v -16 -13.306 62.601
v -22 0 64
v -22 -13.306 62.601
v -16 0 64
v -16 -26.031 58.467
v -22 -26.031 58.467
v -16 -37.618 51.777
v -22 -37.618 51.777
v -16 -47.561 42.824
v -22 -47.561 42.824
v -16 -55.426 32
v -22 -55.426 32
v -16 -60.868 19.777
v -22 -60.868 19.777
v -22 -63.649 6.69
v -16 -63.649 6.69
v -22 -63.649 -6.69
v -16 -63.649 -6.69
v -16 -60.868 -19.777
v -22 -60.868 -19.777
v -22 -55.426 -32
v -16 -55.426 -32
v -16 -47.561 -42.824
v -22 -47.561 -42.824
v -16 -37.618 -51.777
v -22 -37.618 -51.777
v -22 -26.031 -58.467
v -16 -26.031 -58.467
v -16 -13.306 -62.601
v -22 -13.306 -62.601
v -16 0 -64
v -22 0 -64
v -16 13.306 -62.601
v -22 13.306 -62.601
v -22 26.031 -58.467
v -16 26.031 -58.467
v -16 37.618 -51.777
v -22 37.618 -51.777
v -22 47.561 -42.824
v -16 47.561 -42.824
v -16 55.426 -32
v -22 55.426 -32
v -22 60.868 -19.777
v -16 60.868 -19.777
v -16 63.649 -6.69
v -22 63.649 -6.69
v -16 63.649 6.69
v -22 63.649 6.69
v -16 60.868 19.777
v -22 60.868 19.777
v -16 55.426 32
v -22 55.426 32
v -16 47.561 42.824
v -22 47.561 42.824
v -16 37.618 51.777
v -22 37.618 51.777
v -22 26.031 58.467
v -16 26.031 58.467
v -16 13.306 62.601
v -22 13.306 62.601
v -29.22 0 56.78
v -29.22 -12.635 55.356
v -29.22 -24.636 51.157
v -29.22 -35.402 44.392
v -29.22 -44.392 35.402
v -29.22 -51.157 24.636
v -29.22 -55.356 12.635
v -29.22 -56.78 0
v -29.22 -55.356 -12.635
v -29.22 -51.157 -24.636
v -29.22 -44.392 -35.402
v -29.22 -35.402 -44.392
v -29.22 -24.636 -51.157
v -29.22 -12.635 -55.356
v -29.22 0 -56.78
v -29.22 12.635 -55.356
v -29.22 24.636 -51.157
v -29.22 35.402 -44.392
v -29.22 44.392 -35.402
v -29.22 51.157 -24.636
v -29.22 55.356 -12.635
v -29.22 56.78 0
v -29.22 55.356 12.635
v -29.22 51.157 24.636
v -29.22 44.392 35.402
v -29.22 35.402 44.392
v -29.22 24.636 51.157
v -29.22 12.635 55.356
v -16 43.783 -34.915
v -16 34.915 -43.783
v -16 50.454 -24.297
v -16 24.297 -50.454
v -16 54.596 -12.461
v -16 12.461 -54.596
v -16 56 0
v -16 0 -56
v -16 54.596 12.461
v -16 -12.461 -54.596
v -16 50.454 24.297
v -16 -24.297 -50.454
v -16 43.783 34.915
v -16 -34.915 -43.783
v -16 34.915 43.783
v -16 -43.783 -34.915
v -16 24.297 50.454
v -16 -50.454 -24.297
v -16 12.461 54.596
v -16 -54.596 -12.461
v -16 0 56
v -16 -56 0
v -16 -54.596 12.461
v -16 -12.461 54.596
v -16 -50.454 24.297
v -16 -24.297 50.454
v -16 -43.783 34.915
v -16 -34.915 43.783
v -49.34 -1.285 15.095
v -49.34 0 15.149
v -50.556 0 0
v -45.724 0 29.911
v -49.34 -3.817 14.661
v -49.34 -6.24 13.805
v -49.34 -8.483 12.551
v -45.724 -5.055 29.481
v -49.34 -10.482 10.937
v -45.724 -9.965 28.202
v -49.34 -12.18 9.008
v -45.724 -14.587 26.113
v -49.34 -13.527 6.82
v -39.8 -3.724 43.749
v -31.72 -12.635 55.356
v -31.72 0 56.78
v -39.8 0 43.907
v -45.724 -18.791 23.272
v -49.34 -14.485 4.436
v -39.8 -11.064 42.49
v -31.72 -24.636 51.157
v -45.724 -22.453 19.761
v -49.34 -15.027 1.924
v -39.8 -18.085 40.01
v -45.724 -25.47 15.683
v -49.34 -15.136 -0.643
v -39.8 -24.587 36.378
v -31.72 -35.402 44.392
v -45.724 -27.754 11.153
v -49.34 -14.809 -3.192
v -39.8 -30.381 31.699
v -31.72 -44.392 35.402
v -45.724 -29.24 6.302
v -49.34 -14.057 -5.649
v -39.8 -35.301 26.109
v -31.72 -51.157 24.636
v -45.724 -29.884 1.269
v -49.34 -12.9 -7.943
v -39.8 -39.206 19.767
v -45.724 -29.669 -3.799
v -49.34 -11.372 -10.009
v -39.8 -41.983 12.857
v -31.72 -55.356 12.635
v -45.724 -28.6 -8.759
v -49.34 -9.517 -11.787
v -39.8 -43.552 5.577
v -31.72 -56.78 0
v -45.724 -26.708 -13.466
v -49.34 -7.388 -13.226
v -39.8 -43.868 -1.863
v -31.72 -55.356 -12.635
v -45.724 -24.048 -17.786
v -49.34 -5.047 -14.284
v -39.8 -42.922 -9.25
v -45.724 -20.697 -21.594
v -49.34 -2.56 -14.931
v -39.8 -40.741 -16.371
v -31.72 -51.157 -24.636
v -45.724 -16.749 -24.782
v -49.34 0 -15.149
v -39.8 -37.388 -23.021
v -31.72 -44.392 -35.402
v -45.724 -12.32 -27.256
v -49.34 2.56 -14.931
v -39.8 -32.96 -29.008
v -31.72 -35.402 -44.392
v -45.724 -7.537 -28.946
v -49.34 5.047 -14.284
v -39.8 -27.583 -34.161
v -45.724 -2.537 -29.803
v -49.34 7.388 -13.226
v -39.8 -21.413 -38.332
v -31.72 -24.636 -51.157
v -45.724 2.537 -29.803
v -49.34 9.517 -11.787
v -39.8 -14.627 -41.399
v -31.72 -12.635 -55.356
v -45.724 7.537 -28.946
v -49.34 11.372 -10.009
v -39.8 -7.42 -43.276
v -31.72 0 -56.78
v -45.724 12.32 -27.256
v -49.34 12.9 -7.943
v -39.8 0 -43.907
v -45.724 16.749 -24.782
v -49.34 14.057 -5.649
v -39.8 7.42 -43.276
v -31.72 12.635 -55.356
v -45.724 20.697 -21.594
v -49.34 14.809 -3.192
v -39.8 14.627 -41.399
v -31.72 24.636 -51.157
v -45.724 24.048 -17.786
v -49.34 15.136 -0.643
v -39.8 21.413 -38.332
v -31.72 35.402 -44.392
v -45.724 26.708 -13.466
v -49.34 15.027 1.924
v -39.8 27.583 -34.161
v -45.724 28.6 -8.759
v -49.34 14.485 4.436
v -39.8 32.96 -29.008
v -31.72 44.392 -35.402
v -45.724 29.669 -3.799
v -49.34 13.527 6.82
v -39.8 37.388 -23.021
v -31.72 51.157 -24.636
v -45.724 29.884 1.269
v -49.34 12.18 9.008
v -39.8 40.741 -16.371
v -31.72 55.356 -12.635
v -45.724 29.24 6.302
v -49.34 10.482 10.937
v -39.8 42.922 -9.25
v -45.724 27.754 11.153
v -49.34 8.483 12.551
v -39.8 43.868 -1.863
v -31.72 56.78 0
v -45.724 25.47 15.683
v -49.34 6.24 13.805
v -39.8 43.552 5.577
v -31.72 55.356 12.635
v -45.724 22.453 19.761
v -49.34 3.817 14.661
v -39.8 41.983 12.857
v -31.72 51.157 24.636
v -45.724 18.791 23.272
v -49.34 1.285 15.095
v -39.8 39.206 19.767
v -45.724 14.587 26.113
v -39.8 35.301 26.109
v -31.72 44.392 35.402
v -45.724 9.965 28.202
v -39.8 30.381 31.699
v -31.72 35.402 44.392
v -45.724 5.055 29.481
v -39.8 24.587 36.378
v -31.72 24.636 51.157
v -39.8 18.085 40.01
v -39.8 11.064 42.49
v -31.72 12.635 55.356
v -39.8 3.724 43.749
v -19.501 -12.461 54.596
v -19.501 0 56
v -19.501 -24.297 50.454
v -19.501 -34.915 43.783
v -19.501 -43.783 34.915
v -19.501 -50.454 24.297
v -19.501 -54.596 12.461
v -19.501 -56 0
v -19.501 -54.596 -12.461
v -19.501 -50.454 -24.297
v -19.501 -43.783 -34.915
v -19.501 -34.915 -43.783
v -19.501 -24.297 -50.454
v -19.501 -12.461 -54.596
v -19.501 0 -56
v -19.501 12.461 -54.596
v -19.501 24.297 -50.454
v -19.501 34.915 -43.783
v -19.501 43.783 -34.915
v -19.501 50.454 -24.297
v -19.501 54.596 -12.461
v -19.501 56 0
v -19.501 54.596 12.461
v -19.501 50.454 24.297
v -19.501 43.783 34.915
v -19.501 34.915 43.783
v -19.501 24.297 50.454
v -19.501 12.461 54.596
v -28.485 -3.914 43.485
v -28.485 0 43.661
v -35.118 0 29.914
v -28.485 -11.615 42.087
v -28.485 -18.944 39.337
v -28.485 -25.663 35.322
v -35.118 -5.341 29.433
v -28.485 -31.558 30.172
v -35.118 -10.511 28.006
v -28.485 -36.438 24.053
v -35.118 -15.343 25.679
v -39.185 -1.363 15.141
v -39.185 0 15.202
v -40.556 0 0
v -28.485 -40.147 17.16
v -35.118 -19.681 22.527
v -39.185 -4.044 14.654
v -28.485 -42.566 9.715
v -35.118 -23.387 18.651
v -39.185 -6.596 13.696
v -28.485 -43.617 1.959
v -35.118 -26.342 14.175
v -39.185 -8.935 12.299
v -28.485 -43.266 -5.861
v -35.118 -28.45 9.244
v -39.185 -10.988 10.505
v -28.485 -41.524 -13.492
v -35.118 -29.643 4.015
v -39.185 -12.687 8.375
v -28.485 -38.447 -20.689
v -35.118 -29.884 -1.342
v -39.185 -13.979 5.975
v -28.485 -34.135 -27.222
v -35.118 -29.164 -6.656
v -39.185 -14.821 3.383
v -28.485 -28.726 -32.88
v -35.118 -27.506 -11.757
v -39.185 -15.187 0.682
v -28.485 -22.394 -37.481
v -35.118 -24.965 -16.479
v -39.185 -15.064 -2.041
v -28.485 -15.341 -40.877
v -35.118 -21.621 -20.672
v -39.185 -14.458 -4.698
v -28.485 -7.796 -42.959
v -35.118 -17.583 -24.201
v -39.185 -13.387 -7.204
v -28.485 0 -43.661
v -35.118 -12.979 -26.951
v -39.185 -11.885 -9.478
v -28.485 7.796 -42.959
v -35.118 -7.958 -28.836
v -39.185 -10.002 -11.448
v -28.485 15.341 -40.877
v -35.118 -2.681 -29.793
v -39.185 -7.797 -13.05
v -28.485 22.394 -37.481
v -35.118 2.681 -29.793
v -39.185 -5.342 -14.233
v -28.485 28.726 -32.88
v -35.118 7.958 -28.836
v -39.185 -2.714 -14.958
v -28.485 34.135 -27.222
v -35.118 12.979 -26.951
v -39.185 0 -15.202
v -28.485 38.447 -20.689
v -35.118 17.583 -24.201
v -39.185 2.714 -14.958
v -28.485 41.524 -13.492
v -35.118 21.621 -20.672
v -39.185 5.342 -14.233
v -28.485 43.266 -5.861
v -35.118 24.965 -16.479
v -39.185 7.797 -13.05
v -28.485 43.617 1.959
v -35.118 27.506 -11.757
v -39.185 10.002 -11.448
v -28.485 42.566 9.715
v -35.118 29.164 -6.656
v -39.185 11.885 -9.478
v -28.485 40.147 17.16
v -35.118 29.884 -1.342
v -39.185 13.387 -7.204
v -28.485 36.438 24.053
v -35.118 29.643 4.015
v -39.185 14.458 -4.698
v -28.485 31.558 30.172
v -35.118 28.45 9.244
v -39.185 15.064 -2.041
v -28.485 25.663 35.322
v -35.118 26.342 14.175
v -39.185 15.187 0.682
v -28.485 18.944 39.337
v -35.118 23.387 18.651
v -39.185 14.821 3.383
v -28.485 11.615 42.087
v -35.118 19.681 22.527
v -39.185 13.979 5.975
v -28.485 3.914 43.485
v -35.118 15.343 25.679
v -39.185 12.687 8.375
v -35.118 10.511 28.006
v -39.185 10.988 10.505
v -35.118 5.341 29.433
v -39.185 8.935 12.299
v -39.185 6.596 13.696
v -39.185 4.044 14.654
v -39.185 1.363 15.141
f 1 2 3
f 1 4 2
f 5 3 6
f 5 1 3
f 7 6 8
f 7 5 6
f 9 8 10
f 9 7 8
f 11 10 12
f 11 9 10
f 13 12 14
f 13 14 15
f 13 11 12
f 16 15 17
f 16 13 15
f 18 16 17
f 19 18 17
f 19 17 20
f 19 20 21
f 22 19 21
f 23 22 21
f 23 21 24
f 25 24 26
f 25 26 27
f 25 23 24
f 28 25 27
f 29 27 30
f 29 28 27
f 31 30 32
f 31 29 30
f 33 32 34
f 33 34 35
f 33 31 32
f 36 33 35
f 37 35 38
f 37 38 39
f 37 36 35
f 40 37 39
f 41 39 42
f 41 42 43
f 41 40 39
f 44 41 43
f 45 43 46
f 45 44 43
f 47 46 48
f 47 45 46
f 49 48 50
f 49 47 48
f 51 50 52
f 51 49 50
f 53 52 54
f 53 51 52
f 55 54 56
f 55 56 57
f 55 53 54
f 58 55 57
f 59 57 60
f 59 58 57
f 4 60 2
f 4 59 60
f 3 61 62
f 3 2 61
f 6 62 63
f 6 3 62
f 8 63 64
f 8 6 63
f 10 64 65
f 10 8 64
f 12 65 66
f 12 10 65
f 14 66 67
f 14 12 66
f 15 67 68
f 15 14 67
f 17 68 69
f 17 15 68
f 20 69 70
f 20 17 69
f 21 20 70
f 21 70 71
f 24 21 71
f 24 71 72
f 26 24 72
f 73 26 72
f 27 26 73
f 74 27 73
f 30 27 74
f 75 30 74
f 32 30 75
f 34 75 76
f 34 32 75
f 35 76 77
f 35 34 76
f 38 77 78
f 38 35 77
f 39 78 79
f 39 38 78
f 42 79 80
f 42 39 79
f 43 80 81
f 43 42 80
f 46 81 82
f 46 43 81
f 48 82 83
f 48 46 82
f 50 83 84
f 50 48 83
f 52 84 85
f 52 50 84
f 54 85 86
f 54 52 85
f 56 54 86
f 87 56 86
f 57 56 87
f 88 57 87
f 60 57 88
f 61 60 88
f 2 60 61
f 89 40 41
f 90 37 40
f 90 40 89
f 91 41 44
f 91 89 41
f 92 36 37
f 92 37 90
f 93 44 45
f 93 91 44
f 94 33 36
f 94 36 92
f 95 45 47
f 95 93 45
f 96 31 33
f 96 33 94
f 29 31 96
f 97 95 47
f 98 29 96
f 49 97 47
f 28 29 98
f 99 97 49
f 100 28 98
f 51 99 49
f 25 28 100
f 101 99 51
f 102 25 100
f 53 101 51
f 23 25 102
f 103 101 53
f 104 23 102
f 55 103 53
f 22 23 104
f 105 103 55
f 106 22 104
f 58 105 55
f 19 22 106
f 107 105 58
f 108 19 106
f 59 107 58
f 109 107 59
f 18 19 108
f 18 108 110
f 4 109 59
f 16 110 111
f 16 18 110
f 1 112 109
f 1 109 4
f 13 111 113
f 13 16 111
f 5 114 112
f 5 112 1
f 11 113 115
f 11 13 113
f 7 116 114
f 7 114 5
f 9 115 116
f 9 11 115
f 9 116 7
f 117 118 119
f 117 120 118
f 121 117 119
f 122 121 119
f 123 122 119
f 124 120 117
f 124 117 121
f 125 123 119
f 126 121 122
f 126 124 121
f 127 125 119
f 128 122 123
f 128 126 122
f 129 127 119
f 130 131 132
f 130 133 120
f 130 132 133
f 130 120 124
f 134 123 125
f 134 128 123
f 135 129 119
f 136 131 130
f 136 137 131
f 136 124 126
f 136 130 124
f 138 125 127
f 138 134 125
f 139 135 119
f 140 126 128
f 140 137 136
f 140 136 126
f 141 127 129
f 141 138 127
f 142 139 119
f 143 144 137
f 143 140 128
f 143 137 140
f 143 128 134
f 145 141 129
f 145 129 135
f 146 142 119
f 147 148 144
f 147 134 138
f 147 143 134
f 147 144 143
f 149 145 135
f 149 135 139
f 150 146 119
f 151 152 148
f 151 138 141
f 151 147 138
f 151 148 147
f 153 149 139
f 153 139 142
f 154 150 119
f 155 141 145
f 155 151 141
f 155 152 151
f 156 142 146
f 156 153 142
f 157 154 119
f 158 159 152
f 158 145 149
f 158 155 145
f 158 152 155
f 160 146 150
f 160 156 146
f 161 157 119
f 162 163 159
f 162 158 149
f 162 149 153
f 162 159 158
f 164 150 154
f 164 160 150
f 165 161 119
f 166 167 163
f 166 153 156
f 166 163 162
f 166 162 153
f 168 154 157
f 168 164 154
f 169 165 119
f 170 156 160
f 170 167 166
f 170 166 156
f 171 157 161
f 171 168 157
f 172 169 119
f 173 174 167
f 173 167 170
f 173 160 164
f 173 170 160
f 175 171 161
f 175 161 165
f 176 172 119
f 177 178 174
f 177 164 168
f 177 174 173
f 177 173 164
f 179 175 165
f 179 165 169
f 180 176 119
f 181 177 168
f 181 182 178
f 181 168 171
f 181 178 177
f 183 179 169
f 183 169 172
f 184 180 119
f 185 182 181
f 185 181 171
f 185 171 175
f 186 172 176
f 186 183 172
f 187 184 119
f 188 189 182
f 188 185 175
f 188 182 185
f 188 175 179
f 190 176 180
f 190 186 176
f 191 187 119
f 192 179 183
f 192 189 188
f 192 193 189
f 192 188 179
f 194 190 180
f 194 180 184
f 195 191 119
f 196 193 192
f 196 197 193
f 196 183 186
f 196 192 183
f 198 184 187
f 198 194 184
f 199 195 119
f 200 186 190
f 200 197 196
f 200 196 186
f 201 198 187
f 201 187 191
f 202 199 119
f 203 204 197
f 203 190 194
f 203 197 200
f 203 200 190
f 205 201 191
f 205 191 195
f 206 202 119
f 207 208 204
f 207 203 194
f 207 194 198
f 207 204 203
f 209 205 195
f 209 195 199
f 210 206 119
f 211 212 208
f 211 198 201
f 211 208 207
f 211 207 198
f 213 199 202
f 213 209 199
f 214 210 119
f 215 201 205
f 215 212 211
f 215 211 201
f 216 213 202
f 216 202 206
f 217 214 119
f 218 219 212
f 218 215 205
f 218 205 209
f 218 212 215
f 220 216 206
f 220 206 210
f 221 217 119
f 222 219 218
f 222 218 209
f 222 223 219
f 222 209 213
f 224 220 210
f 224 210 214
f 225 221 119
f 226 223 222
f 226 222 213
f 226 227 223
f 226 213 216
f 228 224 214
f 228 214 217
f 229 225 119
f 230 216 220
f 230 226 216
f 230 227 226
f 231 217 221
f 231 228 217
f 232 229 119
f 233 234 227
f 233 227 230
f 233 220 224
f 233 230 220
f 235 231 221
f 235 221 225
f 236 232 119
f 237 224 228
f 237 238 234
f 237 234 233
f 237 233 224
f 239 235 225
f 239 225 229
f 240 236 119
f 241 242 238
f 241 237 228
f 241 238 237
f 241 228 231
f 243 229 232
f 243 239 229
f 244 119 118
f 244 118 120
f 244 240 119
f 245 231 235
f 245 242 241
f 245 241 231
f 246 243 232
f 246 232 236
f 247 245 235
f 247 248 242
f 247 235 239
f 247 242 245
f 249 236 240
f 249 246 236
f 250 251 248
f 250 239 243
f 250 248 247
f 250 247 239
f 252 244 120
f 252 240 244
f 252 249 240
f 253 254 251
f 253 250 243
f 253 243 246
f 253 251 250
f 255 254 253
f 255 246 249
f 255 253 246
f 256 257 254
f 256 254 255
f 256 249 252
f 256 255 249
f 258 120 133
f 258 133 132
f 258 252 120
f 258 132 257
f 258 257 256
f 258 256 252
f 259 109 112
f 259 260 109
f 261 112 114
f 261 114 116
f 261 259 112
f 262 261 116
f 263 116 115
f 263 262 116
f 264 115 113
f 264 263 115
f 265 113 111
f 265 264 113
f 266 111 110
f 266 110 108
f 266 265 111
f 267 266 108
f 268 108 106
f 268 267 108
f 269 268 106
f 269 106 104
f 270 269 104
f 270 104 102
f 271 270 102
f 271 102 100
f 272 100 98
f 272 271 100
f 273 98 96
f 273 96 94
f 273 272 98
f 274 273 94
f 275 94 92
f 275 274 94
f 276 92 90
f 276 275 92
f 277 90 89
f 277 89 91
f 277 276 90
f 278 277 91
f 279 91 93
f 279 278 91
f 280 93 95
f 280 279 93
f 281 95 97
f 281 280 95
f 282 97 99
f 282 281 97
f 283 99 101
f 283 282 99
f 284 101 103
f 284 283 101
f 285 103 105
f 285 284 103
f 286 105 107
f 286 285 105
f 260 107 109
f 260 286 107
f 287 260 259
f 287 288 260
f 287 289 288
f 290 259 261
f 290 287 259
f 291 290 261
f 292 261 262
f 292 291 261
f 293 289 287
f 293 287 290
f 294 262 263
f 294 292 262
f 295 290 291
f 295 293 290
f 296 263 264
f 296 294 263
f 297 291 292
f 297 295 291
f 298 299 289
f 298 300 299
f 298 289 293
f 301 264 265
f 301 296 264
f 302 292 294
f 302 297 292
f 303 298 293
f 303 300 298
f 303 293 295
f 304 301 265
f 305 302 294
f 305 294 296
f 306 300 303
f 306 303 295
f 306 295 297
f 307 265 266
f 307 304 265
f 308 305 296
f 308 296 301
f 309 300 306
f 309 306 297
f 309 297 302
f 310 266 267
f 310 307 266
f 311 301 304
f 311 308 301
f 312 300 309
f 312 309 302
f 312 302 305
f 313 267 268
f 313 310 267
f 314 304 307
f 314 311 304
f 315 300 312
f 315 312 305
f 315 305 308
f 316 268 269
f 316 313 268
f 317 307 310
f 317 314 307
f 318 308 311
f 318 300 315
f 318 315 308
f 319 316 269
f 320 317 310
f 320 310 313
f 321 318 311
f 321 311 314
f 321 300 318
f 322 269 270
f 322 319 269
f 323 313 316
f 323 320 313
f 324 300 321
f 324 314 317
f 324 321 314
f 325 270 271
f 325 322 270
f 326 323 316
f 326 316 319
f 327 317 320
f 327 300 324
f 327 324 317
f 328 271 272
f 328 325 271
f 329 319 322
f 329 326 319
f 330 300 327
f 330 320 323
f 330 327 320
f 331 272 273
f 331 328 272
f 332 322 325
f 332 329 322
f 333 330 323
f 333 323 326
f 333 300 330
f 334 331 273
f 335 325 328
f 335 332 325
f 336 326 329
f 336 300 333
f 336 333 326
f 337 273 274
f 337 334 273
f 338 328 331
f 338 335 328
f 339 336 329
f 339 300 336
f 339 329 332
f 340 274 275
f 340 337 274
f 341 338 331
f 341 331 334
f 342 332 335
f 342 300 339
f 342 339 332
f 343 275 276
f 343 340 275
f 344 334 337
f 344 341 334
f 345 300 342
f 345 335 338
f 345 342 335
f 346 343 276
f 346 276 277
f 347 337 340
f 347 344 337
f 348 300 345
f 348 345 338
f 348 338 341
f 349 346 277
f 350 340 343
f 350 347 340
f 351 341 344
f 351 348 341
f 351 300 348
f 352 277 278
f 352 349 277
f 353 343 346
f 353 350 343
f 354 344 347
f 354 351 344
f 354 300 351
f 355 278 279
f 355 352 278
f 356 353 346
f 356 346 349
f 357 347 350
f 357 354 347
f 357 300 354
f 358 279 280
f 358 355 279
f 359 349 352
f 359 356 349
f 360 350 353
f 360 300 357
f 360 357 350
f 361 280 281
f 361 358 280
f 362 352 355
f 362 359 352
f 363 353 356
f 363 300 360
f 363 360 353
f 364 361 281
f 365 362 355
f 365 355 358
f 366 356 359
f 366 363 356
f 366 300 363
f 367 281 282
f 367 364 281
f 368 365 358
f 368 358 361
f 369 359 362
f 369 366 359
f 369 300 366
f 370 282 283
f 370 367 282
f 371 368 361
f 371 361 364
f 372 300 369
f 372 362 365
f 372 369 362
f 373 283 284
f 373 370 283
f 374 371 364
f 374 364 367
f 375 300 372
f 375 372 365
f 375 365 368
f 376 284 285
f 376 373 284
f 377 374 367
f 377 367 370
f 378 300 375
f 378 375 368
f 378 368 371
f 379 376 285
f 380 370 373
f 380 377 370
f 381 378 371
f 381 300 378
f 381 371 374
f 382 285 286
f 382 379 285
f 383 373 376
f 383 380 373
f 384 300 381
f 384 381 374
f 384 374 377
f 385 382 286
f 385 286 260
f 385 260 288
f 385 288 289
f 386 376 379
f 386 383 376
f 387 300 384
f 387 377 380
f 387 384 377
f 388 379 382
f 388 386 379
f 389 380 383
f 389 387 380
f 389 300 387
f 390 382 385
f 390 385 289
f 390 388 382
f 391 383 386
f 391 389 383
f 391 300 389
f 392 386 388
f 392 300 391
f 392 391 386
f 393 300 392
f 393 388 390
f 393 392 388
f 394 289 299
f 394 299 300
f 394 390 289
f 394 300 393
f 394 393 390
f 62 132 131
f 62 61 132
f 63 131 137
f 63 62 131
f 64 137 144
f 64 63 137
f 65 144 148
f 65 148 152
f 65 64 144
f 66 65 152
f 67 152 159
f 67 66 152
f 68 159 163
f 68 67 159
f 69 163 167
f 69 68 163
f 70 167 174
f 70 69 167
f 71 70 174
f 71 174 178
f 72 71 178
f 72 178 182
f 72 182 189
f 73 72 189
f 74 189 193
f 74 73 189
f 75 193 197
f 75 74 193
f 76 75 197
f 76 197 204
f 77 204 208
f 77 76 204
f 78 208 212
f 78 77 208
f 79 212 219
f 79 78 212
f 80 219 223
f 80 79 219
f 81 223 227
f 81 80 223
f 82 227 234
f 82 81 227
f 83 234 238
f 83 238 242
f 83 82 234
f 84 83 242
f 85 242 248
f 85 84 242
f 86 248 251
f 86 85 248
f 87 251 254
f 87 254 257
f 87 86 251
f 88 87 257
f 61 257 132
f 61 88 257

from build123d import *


with BuildPart() as part:
    # Sketch1 → Revolve1 (revolve)
    with BuildSketch(Plane.XY, mode=Mode.PRIVATE) as revolve1_sk:
        with BuildLine():
            Line((-31.720385191, 56.779614809), (-29.220385191, 56.779614809))
            Line((-29.220385191, 56.779614809), (-22, 64))
            Line((-22, 64), (-16, 64))
            Line((-16, 64), (-16, 56))
            Line((-16, 56), (-19.500883608, 56))
            ThreePointArc((-19.500883608, 56), (-35.117990054, 29.913629212), (-40.555594493, 0))
            Line((-40.555594493, 0), (-50.555594493, 0))
            ThreePointArc((-50.555594493, 0), (-45.723923512, 29.911075571), (-31.720385191, 56.779614809))
        make_face()
    revolve(revolve1_sk.sketch.rotate(Axis((-128.545758478, 0, 0), (1, 0, 0)), 90), axis=Axis((-128.545758478, 0, 0), (1, 0, 0)))


solid = part.part
